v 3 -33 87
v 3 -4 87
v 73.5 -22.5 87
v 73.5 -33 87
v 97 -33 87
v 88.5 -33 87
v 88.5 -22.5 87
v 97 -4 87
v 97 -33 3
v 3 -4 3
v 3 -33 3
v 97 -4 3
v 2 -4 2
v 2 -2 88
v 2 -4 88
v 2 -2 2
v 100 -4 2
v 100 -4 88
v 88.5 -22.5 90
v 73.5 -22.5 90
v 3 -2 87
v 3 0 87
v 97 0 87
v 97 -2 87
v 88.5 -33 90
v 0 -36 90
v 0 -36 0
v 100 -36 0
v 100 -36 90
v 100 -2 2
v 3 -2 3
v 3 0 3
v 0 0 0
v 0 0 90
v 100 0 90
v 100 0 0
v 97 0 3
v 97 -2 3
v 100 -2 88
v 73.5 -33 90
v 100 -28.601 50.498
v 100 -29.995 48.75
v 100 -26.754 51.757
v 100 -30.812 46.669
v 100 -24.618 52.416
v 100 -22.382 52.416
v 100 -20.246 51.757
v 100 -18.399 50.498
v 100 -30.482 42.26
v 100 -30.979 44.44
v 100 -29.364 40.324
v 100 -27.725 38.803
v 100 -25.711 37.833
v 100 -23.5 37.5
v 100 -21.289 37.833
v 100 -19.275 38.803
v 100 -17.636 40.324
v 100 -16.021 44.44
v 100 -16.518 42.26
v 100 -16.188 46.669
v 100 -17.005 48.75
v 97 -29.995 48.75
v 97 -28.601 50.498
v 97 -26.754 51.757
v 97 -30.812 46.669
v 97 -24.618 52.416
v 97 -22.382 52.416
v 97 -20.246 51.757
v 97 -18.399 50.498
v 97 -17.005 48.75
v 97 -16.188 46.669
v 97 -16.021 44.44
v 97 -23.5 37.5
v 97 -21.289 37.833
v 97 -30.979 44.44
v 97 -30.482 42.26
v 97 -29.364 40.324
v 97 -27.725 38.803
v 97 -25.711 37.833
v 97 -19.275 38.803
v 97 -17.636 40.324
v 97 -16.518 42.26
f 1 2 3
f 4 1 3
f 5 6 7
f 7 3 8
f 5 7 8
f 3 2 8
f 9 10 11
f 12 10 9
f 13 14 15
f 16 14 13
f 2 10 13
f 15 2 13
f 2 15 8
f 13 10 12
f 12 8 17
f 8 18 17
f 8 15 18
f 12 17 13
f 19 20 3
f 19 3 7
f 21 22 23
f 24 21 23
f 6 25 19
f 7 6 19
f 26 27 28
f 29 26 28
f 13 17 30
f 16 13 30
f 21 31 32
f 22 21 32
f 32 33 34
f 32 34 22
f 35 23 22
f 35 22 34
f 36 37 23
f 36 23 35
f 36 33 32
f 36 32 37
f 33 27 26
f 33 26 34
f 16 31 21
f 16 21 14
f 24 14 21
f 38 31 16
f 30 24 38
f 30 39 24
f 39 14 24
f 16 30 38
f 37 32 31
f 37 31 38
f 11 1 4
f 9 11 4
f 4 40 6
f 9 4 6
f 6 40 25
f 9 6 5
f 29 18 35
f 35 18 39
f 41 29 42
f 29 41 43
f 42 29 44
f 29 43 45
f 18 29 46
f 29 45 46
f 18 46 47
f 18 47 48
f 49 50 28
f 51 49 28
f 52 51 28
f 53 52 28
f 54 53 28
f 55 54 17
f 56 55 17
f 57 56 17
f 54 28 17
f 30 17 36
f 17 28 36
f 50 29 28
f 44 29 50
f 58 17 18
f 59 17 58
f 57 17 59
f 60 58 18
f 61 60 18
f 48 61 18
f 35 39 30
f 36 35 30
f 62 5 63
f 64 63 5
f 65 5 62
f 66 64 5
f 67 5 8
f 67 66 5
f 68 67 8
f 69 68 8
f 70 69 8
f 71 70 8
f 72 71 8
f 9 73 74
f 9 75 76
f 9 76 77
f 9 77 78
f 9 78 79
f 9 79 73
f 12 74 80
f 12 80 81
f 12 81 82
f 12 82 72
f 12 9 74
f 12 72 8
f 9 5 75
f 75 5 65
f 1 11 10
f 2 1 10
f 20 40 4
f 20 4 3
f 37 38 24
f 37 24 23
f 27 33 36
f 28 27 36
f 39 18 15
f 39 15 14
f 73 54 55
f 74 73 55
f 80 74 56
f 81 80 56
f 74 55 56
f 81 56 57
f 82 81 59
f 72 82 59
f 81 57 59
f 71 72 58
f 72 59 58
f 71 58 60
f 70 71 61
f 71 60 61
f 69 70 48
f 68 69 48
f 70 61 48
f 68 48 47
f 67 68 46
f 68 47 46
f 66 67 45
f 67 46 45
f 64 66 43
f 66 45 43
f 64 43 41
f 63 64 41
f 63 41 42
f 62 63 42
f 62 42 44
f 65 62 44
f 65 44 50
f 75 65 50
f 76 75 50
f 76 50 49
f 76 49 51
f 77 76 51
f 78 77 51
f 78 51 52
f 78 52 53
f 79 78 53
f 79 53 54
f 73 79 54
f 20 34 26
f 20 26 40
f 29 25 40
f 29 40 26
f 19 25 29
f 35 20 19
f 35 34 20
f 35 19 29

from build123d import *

# Parameters (mm, degrees)
SKETCH1_W           = 100
SKETCH1_H           = 36
BOSS_EXTRUDE1_DEPTH = 90
SHELL2_T            = -3
SKETCH3_W           = 15
SKETCH3_H           = 10.5
CUT_EXTRUDE3_DEPTH  = 10
SKETCH5_W           = 86
SKETCH5_H           = 2
CUT_EXTRUDE4_DEPTH  = 98
SKETCH6_R           = 7.5
CUT_EXTRUDE5_DEPTH  = 10


with BuildPart() as part:
    # Sketch1 → Boss-Extrude1 (new body)
    with BuildSketch(Plane.XY):
        with Locations((50, -18)):
            Rectangle(SKETCH1_W, SKETCH1_H)
    extrude(amount=BOSS_EXTRUDE1_DEPTH)

    # Shell2
    shell2_openings = [part.faces().sort_by_distance(p)[0] for p in [
        (50, 0, 45),
    ]]
    offset(amount=SHELL2_T, openings=shell2_openings, kind=Kind.INTERSECTION)

    # Sketch3 → Cut-Extrude3 (cut)
    with BuildSketch(Plane.XY.offset(90)):
        with Locations((81, -27.75)):
            Rectangle(SKETCH3_W, SKETCH3_H)
    extrude(amount=-CUT_EXTRUDE3_DEPTH, mode=Mode.SUBTRACT)

    # Sketch5 → Cut-Extrude4 (cut)
    with BuildSketch(Plane(origin=(100, 0, 0), x_dir=(0, 0, -1), z_dir=(1, 0, 0))):
        with Locations((-45, -3)):
            Rectangle(SKETCH5_W, SKETCH5_H)
    extrude(amount=-CUT_EXTRUDE4_DEPTH, mode=Mode.SUBTRACT)

    # Sketch6 → Cut-Extrude5 (cut)
    with BuildSketch(Plane(origin=(100, 0, 0), x_dir=(0, 0, -1), z_dir=(1, 0, 0))):
        with Locations((-45, -23.5)):
            Circle(SKETCH6_R)
    extrude(amount=-CUT_EXTRUDE5_DEPTH, mode=Mode.SUBTRACT)


solid = part.part
